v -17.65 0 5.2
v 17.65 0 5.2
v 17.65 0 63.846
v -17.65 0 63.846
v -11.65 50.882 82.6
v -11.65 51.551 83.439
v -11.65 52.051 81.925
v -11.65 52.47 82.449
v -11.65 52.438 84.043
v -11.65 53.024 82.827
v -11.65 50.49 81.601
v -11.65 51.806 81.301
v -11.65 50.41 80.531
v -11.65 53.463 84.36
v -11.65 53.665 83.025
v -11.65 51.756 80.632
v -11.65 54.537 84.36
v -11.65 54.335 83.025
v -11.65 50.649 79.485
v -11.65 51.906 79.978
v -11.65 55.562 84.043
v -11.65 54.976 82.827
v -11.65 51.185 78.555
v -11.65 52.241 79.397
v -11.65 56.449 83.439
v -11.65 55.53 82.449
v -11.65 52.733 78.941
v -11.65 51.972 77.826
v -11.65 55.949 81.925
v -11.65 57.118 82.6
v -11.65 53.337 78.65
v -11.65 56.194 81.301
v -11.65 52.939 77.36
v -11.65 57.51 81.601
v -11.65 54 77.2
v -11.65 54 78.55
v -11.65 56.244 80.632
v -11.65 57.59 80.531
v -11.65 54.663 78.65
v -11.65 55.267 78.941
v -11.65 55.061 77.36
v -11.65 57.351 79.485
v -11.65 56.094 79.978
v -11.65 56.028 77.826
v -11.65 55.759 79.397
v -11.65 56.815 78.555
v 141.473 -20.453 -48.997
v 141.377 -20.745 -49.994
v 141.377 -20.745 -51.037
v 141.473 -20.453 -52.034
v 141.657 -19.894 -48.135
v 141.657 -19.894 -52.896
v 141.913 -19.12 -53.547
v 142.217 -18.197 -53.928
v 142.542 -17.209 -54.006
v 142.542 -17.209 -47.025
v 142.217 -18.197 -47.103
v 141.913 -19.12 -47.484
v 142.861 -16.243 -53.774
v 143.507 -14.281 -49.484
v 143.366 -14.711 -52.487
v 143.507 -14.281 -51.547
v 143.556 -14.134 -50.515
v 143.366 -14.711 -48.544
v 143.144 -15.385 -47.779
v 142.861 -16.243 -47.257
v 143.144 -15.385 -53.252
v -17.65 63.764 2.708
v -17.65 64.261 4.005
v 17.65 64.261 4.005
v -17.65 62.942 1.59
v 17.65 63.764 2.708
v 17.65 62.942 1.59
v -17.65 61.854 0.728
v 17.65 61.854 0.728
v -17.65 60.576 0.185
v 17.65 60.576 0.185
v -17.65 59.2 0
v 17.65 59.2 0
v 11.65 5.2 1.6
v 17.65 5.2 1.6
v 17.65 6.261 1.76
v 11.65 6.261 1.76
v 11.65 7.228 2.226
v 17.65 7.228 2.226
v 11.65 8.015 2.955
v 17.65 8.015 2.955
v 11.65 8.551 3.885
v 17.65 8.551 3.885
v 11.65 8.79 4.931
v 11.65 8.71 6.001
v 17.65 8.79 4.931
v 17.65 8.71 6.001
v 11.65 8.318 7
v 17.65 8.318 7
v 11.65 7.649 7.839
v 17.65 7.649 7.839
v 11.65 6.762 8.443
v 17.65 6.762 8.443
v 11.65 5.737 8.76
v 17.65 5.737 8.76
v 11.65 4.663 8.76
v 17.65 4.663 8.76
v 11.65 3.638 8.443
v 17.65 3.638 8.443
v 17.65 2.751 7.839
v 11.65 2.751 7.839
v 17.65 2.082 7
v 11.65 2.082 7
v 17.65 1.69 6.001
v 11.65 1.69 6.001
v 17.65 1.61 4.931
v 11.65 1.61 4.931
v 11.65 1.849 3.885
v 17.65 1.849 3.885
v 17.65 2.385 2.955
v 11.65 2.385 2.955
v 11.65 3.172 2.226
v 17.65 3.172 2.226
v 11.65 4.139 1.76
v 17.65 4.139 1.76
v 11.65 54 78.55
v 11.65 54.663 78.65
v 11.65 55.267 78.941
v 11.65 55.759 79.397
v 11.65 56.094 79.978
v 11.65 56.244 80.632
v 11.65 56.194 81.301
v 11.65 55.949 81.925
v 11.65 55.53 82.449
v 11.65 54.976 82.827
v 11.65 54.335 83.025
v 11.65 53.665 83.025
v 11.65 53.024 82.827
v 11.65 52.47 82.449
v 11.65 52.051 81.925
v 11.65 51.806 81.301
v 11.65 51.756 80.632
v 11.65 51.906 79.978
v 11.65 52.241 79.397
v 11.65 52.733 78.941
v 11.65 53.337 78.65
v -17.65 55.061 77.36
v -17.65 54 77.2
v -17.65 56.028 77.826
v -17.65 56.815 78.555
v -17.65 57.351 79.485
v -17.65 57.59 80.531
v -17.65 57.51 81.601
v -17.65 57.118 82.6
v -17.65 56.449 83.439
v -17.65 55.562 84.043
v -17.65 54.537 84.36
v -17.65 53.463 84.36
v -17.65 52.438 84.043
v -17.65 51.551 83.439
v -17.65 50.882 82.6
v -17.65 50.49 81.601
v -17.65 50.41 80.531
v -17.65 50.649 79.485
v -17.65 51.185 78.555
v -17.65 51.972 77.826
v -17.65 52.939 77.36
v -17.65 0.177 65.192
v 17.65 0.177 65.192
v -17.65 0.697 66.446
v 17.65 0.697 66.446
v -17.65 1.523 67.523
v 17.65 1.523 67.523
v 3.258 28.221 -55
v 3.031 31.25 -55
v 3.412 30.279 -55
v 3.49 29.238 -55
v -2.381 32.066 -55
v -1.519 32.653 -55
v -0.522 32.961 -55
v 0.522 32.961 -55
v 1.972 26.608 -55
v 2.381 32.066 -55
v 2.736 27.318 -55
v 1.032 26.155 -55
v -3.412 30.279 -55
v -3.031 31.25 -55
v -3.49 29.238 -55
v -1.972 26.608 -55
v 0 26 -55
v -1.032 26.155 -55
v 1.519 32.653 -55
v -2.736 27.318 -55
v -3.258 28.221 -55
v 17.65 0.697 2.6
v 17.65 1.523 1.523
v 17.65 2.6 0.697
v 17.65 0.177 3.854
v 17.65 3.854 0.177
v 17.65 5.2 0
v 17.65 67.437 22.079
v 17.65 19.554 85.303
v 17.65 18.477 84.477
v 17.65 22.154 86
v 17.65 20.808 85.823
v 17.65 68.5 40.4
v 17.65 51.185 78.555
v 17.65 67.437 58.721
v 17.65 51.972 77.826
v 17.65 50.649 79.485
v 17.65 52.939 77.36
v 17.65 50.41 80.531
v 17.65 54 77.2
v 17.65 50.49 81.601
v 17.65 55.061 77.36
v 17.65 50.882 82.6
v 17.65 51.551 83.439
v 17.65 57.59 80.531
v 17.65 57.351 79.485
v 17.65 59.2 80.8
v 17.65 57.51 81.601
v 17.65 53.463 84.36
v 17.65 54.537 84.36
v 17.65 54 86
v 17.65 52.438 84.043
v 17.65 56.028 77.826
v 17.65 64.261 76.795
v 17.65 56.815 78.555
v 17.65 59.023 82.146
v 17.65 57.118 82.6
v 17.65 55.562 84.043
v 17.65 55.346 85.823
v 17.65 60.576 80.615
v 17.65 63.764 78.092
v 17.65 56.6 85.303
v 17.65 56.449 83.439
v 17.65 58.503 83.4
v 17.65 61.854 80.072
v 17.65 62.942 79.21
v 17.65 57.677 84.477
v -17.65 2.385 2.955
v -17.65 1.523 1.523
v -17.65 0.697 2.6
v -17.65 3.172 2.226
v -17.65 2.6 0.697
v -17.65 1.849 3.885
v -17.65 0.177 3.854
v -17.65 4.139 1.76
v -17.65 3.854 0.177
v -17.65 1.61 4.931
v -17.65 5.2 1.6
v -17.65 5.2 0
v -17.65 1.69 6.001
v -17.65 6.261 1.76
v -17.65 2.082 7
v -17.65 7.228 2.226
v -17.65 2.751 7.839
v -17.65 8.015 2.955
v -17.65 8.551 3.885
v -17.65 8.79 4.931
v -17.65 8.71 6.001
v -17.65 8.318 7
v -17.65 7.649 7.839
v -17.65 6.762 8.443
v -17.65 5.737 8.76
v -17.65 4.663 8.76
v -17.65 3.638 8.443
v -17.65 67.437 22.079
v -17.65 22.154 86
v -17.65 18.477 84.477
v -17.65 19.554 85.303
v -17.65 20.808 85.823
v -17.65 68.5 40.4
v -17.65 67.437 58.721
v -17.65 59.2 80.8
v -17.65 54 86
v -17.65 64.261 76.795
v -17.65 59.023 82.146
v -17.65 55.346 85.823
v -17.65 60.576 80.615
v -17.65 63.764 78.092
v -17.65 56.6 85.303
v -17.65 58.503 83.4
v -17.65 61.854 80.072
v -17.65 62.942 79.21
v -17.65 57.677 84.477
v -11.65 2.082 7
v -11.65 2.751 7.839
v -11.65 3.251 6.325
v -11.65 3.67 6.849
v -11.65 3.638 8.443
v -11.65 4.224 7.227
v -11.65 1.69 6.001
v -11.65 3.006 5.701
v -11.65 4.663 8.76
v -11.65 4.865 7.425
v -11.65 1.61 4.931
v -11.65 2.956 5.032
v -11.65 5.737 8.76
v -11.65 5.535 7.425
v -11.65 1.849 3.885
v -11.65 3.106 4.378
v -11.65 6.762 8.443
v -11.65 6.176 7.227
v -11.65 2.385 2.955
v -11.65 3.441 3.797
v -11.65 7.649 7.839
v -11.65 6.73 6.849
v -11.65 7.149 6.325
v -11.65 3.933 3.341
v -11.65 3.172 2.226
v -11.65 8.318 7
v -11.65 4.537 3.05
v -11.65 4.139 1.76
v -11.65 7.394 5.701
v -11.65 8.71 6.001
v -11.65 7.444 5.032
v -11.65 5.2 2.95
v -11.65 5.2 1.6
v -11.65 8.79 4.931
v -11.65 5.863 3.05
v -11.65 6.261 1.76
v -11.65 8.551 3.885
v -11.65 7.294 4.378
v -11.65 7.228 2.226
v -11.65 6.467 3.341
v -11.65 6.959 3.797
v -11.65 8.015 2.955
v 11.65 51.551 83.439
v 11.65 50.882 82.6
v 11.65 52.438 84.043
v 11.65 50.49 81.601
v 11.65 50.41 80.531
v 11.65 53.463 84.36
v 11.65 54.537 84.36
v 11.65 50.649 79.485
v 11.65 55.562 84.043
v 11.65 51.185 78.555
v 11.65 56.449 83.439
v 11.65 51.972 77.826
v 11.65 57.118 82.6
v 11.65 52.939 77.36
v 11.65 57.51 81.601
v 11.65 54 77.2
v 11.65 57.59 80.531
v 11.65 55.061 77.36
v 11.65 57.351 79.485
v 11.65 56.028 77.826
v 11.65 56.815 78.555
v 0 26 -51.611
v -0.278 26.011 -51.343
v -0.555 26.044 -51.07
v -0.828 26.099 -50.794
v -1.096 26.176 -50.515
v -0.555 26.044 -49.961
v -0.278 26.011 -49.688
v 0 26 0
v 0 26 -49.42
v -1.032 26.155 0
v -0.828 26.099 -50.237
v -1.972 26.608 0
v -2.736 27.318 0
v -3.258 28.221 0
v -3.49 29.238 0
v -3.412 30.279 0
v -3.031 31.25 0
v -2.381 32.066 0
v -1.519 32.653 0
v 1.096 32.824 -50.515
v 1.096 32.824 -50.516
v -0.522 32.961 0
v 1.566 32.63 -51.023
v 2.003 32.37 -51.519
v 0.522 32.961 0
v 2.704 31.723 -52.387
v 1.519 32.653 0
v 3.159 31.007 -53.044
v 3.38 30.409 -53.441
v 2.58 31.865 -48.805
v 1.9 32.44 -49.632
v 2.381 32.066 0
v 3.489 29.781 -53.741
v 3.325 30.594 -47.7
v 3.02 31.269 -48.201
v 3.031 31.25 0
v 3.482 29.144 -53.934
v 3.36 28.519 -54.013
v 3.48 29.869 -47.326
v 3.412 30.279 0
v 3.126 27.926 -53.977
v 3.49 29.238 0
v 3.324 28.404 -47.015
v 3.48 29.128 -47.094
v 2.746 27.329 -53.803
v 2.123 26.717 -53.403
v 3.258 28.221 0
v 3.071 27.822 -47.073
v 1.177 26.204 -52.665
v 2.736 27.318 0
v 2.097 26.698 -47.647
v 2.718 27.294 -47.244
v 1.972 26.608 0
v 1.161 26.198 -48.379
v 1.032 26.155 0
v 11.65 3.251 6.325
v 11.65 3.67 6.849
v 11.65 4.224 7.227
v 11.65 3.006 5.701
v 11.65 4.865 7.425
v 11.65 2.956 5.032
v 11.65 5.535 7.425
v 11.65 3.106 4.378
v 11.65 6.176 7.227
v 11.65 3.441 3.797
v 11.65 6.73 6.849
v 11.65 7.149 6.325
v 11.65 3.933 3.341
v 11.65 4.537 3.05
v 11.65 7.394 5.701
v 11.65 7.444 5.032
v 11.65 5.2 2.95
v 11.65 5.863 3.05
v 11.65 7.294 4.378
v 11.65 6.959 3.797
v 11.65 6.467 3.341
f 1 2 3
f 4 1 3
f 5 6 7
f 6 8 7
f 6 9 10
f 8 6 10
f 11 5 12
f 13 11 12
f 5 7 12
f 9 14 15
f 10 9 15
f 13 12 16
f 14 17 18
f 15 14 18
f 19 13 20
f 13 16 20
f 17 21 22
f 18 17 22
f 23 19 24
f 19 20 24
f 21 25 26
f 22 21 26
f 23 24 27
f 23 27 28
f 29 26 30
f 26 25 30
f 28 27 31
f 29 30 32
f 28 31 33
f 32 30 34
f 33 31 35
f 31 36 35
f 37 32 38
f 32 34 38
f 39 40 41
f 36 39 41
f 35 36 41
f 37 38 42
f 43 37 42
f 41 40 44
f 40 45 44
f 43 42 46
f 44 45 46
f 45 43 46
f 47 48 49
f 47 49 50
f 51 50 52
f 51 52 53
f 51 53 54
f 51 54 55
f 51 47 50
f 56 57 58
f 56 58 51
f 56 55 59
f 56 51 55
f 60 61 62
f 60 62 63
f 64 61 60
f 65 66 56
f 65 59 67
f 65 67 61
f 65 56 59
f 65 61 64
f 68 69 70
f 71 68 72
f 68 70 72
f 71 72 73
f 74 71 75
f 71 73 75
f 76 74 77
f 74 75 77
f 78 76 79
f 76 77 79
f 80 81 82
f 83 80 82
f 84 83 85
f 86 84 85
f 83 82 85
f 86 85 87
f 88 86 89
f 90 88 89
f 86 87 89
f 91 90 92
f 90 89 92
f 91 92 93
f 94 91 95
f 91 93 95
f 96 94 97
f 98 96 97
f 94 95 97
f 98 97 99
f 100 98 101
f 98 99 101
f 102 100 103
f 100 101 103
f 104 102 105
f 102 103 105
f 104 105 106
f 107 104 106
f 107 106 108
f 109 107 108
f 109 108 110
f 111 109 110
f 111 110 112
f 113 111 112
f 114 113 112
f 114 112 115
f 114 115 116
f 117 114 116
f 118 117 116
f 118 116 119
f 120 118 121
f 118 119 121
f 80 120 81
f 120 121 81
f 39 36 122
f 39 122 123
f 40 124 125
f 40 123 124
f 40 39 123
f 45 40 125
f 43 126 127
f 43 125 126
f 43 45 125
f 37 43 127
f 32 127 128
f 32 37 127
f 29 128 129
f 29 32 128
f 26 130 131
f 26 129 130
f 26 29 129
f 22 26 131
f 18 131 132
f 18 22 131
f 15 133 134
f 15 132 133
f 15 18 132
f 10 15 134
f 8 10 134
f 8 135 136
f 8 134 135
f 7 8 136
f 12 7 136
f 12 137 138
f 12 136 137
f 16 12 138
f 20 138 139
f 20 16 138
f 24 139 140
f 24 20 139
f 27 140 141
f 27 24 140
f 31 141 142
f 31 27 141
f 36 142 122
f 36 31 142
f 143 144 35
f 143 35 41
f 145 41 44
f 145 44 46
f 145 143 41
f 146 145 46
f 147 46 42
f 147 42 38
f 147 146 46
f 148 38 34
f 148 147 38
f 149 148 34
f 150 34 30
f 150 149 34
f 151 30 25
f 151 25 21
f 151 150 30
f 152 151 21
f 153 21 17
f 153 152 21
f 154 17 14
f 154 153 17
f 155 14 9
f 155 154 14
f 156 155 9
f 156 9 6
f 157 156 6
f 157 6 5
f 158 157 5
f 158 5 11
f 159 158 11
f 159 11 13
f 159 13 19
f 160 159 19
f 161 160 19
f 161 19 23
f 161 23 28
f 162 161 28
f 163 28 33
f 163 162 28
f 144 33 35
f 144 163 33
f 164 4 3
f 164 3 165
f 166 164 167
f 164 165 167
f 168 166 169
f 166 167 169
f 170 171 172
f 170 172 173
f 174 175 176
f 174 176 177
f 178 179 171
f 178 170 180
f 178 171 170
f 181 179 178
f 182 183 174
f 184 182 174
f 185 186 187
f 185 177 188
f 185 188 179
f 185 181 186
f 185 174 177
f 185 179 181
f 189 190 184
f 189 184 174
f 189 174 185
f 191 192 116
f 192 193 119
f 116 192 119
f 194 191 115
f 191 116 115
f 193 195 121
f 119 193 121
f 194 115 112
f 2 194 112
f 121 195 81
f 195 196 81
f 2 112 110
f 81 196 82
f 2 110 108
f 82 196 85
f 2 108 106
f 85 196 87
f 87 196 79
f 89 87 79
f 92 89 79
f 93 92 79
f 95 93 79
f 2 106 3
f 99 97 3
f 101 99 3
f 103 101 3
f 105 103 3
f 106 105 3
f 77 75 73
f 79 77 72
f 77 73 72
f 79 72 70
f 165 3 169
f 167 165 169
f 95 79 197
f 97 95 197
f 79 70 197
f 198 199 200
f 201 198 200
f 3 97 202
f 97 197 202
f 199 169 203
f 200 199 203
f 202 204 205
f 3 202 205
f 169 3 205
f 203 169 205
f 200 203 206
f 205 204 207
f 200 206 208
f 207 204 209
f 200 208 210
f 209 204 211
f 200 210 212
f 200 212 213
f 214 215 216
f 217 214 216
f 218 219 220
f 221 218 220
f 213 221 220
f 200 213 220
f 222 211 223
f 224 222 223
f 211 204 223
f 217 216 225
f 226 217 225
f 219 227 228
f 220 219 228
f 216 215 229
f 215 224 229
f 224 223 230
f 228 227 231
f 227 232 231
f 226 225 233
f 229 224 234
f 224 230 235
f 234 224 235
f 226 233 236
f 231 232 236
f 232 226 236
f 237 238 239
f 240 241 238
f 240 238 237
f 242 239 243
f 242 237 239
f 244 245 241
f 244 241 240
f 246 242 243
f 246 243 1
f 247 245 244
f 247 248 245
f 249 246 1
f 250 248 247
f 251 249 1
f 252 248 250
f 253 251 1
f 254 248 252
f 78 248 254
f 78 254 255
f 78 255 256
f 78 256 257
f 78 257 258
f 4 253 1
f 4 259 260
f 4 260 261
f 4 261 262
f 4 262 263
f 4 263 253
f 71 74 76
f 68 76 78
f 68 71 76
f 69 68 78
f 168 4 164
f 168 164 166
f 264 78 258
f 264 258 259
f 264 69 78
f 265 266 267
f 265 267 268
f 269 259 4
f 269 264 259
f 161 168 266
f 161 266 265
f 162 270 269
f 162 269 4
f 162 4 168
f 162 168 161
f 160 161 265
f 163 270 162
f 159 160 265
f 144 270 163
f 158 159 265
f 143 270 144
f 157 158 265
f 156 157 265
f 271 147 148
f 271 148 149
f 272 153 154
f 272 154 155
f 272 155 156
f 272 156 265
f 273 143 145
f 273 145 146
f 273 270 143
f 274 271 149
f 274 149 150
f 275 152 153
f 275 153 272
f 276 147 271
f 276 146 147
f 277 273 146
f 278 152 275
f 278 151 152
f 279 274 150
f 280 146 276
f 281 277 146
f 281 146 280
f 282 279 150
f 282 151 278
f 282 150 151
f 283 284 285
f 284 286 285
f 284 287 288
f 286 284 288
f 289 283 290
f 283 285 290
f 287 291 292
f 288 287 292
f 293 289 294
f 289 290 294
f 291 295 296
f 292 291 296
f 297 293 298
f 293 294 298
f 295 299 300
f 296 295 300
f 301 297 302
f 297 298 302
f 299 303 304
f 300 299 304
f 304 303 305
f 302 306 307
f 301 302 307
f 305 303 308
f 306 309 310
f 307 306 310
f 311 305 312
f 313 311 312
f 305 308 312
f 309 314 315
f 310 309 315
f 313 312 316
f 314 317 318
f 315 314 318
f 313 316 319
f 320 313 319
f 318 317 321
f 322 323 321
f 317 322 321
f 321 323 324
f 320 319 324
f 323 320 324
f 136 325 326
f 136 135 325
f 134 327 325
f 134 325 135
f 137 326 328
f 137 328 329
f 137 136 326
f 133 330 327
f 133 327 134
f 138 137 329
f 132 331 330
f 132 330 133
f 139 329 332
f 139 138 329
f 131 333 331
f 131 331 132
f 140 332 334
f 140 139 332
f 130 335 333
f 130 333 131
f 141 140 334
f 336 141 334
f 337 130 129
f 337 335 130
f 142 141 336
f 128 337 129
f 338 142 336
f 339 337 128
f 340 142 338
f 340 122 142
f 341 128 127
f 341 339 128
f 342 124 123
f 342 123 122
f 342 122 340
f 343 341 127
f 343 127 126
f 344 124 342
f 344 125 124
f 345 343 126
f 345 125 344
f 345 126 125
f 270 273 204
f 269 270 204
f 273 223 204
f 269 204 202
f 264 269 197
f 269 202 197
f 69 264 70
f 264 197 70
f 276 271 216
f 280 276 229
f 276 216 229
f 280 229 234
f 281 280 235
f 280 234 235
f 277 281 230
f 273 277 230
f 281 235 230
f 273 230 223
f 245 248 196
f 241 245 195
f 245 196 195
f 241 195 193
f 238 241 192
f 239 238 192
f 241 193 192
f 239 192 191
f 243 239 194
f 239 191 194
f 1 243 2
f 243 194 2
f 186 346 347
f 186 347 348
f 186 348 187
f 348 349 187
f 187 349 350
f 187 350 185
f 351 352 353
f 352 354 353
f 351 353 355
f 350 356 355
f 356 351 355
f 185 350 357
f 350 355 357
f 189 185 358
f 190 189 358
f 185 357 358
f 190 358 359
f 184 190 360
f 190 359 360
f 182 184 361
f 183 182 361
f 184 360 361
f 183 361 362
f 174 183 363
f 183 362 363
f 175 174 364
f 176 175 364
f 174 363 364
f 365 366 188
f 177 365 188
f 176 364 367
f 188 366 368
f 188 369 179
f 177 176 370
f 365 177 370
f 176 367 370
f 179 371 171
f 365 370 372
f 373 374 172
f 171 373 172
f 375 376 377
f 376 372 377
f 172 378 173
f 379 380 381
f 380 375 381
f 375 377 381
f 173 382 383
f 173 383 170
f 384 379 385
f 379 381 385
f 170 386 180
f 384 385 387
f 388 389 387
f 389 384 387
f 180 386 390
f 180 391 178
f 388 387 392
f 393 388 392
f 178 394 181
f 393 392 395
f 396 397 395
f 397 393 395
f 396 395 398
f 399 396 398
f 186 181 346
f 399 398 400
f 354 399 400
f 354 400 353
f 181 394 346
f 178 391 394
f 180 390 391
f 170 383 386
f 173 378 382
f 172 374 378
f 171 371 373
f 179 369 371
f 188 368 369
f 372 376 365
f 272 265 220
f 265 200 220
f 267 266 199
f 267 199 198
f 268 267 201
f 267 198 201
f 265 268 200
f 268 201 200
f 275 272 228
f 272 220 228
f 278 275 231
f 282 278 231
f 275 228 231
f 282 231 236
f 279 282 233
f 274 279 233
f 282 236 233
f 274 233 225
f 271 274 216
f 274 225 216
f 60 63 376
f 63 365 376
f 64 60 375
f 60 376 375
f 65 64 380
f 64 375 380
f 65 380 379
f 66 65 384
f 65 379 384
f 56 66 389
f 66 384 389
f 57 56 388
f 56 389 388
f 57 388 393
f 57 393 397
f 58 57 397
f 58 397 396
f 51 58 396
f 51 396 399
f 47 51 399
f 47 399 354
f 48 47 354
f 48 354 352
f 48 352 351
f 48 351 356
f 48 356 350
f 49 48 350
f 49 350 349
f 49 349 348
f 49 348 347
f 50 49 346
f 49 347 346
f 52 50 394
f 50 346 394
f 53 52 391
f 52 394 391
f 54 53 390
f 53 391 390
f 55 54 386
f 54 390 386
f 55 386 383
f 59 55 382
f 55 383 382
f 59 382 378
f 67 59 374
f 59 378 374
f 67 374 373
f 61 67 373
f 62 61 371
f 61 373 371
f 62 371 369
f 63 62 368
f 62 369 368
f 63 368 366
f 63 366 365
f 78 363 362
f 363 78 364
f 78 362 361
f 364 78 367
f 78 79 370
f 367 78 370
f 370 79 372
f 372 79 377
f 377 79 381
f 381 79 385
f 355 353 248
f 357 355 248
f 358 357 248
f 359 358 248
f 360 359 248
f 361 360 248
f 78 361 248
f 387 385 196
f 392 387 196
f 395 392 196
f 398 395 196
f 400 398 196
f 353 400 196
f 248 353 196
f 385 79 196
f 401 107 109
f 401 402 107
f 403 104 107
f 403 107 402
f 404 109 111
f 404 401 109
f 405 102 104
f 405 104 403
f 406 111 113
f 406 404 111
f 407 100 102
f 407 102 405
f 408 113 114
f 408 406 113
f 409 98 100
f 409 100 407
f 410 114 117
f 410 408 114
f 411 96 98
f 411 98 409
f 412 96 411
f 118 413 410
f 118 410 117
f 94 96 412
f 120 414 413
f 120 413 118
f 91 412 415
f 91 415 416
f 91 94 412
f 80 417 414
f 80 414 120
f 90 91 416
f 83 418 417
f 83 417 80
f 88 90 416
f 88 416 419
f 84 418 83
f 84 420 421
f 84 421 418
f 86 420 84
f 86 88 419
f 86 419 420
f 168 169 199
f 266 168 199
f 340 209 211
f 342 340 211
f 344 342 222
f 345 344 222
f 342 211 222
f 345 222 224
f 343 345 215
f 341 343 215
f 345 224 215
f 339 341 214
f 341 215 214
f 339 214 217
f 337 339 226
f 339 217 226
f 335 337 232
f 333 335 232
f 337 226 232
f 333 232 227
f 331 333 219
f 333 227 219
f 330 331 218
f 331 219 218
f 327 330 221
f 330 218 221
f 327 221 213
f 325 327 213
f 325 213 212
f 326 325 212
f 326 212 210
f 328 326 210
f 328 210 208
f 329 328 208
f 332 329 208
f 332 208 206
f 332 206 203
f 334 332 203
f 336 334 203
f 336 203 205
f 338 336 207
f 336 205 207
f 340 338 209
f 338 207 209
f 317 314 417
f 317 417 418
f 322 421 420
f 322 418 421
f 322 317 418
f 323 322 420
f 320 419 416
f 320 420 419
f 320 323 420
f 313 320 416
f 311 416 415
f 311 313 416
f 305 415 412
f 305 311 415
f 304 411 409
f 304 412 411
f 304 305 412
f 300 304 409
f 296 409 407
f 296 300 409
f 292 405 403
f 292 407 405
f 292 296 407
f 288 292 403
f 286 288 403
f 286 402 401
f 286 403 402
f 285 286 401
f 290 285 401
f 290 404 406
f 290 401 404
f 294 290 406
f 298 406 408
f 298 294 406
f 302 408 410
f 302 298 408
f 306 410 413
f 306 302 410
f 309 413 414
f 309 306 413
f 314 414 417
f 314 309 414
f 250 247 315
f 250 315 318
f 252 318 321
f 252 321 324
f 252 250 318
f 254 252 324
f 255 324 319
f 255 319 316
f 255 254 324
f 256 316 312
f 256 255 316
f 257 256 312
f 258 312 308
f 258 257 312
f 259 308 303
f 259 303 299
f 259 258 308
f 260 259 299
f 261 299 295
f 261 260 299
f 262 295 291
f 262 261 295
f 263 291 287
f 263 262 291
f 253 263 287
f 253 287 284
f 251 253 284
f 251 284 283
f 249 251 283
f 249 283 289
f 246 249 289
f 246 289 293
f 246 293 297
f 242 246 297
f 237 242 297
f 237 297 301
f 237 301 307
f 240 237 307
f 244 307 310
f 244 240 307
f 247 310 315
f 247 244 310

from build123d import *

# Parameters (mm, degrees)
ESQUISSE2_R      = 2.25
EXTRUSION1_DEPTH = 17.65
ESQUISSE3_R      = 3.6
EXTRUSION2_DEPTH = 6
ESQUISSE4_R      = 3.5
EXTRUSION3_DEPTH = 55
ESQUISSE6_R      = 3.5
EXTRUSION4_DEPTH = 150


with BuildPart() as part:
    # Esquisse2 → Extrusion1 (new, symmetric)
    with BuildSketch(Plane(origin=(0, 0, 0), x_dir=(0, 0, -1), z_dir=(1, 0, 0))):
        with BuildLine():
            Line((-67.523044738, 1.523044738), (-84.476955262, 18.476955262))
            ThreePointArc((-84.476955262, 18.476955262), (-85.604173569, 20.163956676), (-86, 22.153910524))
            Line((-86, 22.153910524), (-86, 54))
            ThreePointArc((-86, 54), (-84.476955262, 57.676955262), (-80.8, 59.2))
            ThreePointArc((-80.8, 59.2), (-79.677669391, 62.426857966), (-76.795149102, 64.260792292))
            ThreePointArc((-76.795149102, 64.260792292), (-40.4, 68.5), (-4.004850898, 64.260792292))
            ThreePointArc((-4.004850898, 64.260792292), (-1.122330609, 62.426857966), (0, 59.2))
            Line((0, 59.2), (0, 5.2))
            ThreePointArc((0, 5.2), (-1.523044738, 1.523044738), (-5.2, 0))
            Line((-5.2, 0), (-63.846089476, 0))
            ThreePointArc((-63.846089476, 0), (-65.836043324, 0.395826431), (-67.523044738, 1.523044738))
        make_face()
        with Locations((-80.8, 54)):
            Circle(ESQUISSE2_R, mode=Mode.SUBTRACT)
        with Locations((-5.2, 5.2)):
            Circle(ESQUISSE2_R, mode=Mode.SUBTRACT)
    extrude(amount=EXTRUSION1_DEPTH, both=True)

    # Esquisse3 → Extrusion2 (cut)
    with BuildSketch(Plane(origin=(17.65, 0, 0), x_dir=(0, 0, -1), z_dir=(1, 0, 0))):
        with Locations((-80.8, 54)):
            Circle(ESQUISSE3_R)
        with Locations((-5.2, 5.2)):
            Circle(ESQUISSE3_R)
    extrusion2 = extrude(amount=-EXTRUSION2_DEPTH, mode=Mode.SUBTRACT)

    # Symétrie1: Extrusion2 across plane
    add(extrusion2.mirror(Plane(origin=(0, 0, 0), x_dir=(0, 0, 1), z_dir=(1, 0, 0))), mode=Mode.SUBTRACT)

    # Esquisse4 → Extrusion3 (add)
    with BuildSketch(Plane(origin=(0, 0, 0), x_dir=(-1, 0, 0), z_dir=(0, 0, -1))):
        with Locations(Location((0, 29.5, 0), (0, 0, 270))):
            Circle(ESQUISSE4_R)
    extrude(amount=EXTRUSION3_DEPTH)

    # Esquisse6 → Extrusion4 (add)
    with BuildSketch(Plane(origin=(-8.7708228, 2.891030086, 0), x_dir=(0, 0, -1), z_dir=(0.9497362687231024, -0.3130511457764037, 0))):
        with Locations(Location((50.51548438, 28.017219927, 0), (0, 0, 90))):
            Circle(ESQUISSE6_R)
    extrude(amount=EXTRUSION4_DEPTH)


solid = part.part
